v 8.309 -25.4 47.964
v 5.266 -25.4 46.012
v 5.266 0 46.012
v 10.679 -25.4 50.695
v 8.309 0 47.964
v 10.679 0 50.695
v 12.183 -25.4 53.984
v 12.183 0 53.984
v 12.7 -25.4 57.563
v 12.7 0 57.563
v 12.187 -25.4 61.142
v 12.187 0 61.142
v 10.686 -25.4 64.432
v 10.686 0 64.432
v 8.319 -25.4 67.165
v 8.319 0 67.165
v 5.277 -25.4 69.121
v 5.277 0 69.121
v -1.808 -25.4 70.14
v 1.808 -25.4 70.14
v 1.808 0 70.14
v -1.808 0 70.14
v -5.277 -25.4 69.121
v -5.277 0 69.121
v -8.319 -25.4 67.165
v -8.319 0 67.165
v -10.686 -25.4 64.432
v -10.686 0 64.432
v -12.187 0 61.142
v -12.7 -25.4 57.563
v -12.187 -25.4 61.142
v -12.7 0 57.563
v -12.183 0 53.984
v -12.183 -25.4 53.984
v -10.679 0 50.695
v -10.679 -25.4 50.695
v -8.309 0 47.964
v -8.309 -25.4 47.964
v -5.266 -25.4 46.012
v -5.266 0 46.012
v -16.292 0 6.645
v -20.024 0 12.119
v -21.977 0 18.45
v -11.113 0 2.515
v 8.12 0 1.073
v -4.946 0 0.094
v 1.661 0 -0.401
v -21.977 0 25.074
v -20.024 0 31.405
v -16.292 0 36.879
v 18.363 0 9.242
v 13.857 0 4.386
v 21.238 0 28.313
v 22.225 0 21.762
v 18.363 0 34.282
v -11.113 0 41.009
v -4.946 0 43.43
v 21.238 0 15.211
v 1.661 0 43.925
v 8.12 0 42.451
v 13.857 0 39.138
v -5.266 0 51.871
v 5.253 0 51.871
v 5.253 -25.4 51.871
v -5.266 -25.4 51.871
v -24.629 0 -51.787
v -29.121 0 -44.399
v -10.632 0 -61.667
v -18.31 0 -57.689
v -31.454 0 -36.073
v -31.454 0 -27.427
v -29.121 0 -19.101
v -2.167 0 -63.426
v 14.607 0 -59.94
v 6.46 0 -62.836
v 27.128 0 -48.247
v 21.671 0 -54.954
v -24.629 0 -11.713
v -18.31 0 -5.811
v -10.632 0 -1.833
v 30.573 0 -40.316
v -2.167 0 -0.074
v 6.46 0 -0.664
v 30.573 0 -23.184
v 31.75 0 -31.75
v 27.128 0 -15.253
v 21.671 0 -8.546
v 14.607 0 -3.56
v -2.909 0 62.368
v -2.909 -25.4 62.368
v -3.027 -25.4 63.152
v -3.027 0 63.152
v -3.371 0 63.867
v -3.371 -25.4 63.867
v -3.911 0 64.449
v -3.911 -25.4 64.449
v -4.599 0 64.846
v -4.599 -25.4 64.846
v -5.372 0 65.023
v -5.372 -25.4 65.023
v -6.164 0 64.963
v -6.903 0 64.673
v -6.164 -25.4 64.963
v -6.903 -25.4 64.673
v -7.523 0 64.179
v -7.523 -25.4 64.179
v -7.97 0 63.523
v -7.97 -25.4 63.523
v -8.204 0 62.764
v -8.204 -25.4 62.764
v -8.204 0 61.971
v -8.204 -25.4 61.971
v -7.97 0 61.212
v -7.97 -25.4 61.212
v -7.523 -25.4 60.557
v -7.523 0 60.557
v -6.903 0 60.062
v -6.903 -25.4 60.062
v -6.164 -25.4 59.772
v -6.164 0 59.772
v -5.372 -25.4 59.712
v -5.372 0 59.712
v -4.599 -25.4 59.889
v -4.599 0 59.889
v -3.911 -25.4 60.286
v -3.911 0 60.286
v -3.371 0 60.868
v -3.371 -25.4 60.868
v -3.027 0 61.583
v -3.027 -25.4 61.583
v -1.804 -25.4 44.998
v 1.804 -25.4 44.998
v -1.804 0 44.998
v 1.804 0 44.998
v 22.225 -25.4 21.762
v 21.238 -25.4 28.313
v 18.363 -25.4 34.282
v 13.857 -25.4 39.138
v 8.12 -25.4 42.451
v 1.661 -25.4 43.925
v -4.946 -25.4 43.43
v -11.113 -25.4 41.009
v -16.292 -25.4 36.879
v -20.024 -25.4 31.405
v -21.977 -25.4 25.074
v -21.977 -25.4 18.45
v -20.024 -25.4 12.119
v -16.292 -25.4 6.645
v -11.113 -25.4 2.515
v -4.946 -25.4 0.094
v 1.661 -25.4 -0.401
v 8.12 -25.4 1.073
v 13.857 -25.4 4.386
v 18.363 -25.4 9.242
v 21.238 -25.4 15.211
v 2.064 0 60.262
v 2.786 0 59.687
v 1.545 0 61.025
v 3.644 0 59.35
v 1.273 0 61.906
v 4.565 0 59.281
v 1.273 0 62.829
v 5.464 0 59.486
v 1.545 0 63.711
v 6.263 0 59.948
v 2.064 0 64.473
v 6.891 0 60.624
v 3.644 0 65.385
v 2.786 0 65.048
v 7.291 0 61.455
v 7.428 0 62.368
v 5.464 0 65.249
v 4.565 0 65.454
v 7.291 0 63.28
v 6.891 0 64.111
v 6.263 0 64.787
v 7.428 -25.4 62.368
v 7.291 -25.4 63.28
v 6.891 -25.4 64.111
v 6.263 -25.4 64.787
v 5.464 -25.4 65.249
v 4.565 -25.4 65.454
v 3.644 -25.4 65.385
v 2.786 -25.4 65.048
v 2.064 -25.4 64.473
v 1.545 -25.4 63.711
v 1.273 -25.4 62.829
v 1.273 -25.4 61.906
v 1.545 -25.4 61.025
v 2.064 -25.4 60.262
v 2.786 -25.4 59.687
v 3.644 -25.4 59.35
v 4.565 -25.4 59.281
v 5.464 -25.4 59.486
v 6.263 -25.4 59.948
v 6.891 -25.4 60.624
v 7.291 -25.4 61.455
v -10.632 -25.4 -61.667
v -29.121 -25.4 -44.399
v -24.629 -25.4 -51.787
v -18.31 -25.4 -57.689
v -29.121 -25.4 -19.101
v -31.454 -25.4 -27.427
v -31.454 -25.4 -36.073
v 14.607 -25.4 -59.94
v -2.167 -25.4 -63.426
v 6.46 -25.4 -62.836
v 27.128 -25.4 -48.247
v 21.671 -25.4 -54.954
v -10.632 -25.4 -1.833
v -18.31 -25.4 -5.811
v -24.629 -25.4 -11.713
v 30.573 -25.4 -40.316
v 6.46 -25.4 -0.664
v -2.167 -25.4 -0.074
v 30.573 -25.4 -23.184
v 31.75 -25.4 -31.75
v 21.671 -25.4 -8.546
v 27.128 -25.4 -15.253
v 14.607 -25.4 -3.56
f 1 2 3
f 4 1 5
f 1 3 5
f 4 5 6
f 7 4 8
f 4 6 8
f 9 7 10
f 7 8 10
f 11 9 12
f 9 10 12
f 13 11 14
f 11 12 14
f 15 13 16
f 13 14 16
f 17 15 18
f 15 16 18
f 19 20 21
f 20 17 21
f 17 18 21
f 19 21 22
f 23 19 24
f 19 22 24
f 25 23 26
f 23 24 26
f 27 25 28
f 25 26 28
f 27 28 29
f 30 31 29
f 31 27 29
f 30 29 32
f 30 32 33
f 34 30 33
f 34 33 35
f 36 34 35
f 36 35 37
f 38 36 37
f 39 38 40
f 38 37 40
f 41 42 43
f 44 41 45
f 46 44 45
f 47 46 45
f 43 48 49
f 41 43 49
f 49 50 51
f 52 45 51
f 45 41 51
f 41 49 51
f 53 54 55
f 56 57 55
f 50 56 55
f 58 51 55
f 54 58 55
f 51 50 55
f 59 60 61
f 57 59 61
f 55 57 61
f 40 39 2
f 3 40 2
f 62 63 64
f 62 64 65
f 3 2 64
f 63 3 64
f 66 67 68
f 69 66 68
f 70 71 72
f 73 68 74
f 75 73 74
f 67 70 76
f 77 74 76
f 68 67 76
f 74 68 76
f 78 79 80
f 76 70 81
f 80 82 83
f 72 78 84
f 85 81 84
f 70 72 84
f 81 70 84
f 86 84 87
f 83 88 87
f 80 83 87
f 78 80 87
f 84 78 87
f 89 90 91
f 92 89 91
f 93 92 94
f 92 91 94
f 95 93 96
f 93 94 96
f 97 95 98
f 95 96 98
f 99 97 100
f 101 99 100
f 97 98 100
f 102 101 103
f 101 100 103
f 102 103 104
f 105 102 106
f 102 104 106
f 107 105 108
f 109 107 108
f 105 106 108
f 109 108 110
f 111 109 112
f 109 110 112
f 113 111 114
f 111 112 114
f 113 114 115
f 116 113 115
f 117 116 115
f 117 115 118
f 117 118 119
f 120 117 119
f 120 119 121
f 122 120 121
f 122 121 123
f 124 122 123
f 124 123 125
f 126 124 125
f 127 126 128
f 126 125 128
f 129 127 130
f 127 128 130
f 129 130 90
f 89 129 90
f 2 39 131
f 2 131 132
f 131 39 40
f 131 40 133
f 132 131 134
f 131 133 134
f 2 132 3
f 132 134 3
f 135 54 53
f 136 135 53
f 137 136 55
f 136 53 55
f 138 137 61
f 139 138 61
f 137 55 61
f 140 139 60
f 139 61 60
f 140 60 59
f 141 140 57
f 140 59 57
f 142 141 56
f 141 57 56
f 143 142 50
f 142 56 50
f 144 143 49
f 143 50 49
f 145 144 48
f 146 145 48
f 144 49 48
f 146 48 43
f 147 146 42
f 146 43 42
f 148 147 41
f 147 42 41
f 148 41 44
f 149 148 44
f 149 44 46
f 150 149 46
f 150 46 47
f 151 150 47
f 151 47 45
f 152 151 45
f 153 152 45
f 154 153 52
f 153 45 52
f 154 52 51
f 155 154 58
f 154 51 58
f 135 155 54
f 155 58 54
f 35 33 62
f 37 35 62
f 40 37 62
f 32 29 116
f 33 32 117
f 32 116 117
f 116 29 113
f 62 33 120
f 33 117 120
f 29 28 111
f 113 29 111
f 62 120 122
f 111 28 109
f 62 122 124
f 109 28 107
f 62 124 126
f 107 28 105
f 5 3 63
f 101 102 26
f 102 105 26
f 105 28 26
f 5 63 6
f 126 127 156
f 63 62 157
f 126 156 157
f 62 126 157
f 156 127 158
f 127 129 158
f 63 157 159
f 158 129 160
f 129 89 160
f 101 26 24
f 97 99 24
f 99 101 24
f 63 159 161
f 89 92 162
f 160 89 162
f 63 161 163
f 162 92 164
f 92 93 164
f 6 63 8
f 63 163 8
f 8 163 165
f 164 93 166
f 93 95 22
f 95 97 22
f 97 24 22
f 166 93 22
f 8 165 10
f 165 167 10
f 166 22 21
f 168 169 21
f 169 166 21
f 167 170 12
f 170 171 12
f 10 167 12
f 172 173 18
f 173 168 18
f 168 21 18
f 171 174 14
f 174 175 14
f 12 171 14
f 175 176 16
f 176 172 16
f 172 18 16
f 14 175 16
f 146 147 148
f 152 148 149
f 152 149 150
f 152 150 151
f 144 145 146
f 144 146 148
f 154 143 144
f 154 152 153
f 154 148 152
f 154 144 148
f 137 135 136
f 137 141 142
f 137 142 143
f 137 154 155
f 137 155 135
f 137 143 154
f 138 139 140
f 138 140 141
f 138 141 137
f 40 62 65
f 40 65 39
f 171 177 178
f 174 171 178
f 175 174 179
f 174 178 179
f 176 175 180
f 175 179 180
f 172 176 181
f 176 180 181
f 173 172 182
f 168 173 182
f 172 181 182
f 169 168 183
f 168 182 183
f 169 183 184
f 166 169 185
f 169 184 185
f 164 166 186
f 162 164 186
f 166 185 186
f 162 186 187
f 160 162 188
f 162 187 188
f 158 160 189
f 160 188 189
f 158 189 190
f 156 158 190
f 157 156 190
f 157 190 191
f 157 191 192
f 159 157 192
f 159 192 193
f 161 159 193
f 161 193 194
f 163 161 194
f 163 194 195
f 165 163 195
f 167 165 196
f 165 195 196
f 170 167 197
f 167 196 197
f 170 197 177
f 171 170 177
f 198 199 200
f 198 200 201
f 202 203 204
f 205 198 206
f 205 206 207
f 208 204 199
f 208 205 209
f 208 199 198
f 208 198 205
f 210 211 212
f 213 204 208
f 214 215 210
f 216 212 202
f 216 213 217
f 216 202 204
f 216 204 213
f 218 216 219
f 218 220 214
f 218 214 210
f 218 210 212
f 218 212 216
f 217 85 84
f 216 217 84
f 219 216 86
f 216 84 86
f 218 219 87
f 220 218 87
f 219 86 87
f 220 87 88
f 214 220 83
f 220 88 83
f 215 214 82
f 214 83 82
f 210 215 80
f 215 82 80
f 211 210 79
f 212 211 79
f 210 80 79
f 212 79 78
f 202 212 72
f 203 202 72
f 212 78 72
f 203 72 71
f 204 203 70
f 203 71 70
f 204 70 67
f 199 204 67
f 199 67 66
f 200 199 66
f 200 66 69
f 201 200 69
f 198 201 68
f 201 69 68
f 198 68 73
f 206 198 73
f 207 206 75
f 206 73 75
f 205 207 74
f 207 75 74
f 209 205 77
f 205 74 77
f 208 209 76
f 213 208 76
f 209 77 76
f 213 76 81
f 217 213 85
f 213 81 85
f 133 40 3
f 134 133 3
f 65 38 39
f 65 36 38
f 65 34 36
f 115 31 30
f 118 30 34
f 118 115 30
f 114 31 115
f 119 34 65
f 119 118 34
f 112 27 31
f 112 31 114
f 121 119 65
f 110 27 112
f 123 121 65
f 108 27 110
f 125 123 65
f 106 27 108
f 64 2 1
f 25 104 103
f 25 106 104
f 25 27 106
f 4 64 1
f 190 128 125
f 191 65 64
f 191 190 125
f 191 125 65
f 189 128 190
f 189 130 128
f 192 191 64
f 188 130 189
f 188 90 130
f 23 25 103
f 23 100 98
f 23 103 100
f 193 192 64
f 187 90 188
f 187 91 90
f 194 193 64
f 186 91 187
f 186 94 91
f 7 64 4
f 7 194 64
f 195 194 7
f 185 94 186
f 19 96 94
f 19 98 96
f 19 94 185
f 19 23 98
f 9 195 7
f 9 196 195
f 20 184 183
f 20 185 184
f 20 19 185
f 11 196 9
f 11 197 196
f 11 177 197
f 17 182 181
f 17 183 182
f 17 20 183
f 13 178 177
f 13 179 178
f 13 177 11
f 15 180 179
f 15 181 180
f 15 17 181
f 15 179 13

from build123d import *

# Parameters (mm, degrees)
F0_R     = 31.75
F1_DEPTH = 25.4
F2_R     = 22.225
F3_DEPTH = 25.4
F2_R_2   = 12.7
F4_R     = 3.0951637775
F4_R_2   = 2.662560035
F5_DEPTH = 25.4
F7_DEPTH = 25.4


with BuildPart() as f1:
    # F0 (on Front) → F1 (new body)
    with BuildSketch(Plane.XZ):
        with Locations((0, -31.75)):
            Circle(F0_R)
    extrude(amount=F1_DEPTH)


with BuildPart() as f3:
    # F2 (on Front) → F3 (new body)
    with BuildSketch(Plane.XZ):
        with Locations((0, 21.7619820305)):
            Circle(F2_R)
    extrude(amount=F3_DEPTH)


with BuildPart() as f3b:
    # F2 (on Front) → F3, piece 2 (new body)
    with BuildSketch(Plane.XZ):
        with Locations((0, 57.5689266813)):
            Circle(F2_R_2)
    extrude(amount=F3_DEPTH)

    # F4 (on face) → F5 (cut)
    with BuildSketch(Plane.XZ.offset(25.4)):
        with Locations((4.3332311325, 62.3675622046)):
            Circle(F4_R)
        with Locations((-5.5712959729, 62.3675622046)):
            Circle(F4_R_2)
    extrude(amount=-F5_DEPTH, mode=Mode.SUBTRACT)

    # F6 (on face) → F7 (cut)
    with BuildSketch(Plane.XZ.offset(25.4)):
        Polygon((5.253074225, 51.8712922931), (-5.2657830529, 51.8712922931), (-5.2657830529, 46.0120443665), (5.2657830529, 46.0120443665), align=None)
    extrude(amount=-F7_DEPTH, mode=Mode.SUBTRACT)


solid = Compound([f1.part, f3.part, f3b.part])
